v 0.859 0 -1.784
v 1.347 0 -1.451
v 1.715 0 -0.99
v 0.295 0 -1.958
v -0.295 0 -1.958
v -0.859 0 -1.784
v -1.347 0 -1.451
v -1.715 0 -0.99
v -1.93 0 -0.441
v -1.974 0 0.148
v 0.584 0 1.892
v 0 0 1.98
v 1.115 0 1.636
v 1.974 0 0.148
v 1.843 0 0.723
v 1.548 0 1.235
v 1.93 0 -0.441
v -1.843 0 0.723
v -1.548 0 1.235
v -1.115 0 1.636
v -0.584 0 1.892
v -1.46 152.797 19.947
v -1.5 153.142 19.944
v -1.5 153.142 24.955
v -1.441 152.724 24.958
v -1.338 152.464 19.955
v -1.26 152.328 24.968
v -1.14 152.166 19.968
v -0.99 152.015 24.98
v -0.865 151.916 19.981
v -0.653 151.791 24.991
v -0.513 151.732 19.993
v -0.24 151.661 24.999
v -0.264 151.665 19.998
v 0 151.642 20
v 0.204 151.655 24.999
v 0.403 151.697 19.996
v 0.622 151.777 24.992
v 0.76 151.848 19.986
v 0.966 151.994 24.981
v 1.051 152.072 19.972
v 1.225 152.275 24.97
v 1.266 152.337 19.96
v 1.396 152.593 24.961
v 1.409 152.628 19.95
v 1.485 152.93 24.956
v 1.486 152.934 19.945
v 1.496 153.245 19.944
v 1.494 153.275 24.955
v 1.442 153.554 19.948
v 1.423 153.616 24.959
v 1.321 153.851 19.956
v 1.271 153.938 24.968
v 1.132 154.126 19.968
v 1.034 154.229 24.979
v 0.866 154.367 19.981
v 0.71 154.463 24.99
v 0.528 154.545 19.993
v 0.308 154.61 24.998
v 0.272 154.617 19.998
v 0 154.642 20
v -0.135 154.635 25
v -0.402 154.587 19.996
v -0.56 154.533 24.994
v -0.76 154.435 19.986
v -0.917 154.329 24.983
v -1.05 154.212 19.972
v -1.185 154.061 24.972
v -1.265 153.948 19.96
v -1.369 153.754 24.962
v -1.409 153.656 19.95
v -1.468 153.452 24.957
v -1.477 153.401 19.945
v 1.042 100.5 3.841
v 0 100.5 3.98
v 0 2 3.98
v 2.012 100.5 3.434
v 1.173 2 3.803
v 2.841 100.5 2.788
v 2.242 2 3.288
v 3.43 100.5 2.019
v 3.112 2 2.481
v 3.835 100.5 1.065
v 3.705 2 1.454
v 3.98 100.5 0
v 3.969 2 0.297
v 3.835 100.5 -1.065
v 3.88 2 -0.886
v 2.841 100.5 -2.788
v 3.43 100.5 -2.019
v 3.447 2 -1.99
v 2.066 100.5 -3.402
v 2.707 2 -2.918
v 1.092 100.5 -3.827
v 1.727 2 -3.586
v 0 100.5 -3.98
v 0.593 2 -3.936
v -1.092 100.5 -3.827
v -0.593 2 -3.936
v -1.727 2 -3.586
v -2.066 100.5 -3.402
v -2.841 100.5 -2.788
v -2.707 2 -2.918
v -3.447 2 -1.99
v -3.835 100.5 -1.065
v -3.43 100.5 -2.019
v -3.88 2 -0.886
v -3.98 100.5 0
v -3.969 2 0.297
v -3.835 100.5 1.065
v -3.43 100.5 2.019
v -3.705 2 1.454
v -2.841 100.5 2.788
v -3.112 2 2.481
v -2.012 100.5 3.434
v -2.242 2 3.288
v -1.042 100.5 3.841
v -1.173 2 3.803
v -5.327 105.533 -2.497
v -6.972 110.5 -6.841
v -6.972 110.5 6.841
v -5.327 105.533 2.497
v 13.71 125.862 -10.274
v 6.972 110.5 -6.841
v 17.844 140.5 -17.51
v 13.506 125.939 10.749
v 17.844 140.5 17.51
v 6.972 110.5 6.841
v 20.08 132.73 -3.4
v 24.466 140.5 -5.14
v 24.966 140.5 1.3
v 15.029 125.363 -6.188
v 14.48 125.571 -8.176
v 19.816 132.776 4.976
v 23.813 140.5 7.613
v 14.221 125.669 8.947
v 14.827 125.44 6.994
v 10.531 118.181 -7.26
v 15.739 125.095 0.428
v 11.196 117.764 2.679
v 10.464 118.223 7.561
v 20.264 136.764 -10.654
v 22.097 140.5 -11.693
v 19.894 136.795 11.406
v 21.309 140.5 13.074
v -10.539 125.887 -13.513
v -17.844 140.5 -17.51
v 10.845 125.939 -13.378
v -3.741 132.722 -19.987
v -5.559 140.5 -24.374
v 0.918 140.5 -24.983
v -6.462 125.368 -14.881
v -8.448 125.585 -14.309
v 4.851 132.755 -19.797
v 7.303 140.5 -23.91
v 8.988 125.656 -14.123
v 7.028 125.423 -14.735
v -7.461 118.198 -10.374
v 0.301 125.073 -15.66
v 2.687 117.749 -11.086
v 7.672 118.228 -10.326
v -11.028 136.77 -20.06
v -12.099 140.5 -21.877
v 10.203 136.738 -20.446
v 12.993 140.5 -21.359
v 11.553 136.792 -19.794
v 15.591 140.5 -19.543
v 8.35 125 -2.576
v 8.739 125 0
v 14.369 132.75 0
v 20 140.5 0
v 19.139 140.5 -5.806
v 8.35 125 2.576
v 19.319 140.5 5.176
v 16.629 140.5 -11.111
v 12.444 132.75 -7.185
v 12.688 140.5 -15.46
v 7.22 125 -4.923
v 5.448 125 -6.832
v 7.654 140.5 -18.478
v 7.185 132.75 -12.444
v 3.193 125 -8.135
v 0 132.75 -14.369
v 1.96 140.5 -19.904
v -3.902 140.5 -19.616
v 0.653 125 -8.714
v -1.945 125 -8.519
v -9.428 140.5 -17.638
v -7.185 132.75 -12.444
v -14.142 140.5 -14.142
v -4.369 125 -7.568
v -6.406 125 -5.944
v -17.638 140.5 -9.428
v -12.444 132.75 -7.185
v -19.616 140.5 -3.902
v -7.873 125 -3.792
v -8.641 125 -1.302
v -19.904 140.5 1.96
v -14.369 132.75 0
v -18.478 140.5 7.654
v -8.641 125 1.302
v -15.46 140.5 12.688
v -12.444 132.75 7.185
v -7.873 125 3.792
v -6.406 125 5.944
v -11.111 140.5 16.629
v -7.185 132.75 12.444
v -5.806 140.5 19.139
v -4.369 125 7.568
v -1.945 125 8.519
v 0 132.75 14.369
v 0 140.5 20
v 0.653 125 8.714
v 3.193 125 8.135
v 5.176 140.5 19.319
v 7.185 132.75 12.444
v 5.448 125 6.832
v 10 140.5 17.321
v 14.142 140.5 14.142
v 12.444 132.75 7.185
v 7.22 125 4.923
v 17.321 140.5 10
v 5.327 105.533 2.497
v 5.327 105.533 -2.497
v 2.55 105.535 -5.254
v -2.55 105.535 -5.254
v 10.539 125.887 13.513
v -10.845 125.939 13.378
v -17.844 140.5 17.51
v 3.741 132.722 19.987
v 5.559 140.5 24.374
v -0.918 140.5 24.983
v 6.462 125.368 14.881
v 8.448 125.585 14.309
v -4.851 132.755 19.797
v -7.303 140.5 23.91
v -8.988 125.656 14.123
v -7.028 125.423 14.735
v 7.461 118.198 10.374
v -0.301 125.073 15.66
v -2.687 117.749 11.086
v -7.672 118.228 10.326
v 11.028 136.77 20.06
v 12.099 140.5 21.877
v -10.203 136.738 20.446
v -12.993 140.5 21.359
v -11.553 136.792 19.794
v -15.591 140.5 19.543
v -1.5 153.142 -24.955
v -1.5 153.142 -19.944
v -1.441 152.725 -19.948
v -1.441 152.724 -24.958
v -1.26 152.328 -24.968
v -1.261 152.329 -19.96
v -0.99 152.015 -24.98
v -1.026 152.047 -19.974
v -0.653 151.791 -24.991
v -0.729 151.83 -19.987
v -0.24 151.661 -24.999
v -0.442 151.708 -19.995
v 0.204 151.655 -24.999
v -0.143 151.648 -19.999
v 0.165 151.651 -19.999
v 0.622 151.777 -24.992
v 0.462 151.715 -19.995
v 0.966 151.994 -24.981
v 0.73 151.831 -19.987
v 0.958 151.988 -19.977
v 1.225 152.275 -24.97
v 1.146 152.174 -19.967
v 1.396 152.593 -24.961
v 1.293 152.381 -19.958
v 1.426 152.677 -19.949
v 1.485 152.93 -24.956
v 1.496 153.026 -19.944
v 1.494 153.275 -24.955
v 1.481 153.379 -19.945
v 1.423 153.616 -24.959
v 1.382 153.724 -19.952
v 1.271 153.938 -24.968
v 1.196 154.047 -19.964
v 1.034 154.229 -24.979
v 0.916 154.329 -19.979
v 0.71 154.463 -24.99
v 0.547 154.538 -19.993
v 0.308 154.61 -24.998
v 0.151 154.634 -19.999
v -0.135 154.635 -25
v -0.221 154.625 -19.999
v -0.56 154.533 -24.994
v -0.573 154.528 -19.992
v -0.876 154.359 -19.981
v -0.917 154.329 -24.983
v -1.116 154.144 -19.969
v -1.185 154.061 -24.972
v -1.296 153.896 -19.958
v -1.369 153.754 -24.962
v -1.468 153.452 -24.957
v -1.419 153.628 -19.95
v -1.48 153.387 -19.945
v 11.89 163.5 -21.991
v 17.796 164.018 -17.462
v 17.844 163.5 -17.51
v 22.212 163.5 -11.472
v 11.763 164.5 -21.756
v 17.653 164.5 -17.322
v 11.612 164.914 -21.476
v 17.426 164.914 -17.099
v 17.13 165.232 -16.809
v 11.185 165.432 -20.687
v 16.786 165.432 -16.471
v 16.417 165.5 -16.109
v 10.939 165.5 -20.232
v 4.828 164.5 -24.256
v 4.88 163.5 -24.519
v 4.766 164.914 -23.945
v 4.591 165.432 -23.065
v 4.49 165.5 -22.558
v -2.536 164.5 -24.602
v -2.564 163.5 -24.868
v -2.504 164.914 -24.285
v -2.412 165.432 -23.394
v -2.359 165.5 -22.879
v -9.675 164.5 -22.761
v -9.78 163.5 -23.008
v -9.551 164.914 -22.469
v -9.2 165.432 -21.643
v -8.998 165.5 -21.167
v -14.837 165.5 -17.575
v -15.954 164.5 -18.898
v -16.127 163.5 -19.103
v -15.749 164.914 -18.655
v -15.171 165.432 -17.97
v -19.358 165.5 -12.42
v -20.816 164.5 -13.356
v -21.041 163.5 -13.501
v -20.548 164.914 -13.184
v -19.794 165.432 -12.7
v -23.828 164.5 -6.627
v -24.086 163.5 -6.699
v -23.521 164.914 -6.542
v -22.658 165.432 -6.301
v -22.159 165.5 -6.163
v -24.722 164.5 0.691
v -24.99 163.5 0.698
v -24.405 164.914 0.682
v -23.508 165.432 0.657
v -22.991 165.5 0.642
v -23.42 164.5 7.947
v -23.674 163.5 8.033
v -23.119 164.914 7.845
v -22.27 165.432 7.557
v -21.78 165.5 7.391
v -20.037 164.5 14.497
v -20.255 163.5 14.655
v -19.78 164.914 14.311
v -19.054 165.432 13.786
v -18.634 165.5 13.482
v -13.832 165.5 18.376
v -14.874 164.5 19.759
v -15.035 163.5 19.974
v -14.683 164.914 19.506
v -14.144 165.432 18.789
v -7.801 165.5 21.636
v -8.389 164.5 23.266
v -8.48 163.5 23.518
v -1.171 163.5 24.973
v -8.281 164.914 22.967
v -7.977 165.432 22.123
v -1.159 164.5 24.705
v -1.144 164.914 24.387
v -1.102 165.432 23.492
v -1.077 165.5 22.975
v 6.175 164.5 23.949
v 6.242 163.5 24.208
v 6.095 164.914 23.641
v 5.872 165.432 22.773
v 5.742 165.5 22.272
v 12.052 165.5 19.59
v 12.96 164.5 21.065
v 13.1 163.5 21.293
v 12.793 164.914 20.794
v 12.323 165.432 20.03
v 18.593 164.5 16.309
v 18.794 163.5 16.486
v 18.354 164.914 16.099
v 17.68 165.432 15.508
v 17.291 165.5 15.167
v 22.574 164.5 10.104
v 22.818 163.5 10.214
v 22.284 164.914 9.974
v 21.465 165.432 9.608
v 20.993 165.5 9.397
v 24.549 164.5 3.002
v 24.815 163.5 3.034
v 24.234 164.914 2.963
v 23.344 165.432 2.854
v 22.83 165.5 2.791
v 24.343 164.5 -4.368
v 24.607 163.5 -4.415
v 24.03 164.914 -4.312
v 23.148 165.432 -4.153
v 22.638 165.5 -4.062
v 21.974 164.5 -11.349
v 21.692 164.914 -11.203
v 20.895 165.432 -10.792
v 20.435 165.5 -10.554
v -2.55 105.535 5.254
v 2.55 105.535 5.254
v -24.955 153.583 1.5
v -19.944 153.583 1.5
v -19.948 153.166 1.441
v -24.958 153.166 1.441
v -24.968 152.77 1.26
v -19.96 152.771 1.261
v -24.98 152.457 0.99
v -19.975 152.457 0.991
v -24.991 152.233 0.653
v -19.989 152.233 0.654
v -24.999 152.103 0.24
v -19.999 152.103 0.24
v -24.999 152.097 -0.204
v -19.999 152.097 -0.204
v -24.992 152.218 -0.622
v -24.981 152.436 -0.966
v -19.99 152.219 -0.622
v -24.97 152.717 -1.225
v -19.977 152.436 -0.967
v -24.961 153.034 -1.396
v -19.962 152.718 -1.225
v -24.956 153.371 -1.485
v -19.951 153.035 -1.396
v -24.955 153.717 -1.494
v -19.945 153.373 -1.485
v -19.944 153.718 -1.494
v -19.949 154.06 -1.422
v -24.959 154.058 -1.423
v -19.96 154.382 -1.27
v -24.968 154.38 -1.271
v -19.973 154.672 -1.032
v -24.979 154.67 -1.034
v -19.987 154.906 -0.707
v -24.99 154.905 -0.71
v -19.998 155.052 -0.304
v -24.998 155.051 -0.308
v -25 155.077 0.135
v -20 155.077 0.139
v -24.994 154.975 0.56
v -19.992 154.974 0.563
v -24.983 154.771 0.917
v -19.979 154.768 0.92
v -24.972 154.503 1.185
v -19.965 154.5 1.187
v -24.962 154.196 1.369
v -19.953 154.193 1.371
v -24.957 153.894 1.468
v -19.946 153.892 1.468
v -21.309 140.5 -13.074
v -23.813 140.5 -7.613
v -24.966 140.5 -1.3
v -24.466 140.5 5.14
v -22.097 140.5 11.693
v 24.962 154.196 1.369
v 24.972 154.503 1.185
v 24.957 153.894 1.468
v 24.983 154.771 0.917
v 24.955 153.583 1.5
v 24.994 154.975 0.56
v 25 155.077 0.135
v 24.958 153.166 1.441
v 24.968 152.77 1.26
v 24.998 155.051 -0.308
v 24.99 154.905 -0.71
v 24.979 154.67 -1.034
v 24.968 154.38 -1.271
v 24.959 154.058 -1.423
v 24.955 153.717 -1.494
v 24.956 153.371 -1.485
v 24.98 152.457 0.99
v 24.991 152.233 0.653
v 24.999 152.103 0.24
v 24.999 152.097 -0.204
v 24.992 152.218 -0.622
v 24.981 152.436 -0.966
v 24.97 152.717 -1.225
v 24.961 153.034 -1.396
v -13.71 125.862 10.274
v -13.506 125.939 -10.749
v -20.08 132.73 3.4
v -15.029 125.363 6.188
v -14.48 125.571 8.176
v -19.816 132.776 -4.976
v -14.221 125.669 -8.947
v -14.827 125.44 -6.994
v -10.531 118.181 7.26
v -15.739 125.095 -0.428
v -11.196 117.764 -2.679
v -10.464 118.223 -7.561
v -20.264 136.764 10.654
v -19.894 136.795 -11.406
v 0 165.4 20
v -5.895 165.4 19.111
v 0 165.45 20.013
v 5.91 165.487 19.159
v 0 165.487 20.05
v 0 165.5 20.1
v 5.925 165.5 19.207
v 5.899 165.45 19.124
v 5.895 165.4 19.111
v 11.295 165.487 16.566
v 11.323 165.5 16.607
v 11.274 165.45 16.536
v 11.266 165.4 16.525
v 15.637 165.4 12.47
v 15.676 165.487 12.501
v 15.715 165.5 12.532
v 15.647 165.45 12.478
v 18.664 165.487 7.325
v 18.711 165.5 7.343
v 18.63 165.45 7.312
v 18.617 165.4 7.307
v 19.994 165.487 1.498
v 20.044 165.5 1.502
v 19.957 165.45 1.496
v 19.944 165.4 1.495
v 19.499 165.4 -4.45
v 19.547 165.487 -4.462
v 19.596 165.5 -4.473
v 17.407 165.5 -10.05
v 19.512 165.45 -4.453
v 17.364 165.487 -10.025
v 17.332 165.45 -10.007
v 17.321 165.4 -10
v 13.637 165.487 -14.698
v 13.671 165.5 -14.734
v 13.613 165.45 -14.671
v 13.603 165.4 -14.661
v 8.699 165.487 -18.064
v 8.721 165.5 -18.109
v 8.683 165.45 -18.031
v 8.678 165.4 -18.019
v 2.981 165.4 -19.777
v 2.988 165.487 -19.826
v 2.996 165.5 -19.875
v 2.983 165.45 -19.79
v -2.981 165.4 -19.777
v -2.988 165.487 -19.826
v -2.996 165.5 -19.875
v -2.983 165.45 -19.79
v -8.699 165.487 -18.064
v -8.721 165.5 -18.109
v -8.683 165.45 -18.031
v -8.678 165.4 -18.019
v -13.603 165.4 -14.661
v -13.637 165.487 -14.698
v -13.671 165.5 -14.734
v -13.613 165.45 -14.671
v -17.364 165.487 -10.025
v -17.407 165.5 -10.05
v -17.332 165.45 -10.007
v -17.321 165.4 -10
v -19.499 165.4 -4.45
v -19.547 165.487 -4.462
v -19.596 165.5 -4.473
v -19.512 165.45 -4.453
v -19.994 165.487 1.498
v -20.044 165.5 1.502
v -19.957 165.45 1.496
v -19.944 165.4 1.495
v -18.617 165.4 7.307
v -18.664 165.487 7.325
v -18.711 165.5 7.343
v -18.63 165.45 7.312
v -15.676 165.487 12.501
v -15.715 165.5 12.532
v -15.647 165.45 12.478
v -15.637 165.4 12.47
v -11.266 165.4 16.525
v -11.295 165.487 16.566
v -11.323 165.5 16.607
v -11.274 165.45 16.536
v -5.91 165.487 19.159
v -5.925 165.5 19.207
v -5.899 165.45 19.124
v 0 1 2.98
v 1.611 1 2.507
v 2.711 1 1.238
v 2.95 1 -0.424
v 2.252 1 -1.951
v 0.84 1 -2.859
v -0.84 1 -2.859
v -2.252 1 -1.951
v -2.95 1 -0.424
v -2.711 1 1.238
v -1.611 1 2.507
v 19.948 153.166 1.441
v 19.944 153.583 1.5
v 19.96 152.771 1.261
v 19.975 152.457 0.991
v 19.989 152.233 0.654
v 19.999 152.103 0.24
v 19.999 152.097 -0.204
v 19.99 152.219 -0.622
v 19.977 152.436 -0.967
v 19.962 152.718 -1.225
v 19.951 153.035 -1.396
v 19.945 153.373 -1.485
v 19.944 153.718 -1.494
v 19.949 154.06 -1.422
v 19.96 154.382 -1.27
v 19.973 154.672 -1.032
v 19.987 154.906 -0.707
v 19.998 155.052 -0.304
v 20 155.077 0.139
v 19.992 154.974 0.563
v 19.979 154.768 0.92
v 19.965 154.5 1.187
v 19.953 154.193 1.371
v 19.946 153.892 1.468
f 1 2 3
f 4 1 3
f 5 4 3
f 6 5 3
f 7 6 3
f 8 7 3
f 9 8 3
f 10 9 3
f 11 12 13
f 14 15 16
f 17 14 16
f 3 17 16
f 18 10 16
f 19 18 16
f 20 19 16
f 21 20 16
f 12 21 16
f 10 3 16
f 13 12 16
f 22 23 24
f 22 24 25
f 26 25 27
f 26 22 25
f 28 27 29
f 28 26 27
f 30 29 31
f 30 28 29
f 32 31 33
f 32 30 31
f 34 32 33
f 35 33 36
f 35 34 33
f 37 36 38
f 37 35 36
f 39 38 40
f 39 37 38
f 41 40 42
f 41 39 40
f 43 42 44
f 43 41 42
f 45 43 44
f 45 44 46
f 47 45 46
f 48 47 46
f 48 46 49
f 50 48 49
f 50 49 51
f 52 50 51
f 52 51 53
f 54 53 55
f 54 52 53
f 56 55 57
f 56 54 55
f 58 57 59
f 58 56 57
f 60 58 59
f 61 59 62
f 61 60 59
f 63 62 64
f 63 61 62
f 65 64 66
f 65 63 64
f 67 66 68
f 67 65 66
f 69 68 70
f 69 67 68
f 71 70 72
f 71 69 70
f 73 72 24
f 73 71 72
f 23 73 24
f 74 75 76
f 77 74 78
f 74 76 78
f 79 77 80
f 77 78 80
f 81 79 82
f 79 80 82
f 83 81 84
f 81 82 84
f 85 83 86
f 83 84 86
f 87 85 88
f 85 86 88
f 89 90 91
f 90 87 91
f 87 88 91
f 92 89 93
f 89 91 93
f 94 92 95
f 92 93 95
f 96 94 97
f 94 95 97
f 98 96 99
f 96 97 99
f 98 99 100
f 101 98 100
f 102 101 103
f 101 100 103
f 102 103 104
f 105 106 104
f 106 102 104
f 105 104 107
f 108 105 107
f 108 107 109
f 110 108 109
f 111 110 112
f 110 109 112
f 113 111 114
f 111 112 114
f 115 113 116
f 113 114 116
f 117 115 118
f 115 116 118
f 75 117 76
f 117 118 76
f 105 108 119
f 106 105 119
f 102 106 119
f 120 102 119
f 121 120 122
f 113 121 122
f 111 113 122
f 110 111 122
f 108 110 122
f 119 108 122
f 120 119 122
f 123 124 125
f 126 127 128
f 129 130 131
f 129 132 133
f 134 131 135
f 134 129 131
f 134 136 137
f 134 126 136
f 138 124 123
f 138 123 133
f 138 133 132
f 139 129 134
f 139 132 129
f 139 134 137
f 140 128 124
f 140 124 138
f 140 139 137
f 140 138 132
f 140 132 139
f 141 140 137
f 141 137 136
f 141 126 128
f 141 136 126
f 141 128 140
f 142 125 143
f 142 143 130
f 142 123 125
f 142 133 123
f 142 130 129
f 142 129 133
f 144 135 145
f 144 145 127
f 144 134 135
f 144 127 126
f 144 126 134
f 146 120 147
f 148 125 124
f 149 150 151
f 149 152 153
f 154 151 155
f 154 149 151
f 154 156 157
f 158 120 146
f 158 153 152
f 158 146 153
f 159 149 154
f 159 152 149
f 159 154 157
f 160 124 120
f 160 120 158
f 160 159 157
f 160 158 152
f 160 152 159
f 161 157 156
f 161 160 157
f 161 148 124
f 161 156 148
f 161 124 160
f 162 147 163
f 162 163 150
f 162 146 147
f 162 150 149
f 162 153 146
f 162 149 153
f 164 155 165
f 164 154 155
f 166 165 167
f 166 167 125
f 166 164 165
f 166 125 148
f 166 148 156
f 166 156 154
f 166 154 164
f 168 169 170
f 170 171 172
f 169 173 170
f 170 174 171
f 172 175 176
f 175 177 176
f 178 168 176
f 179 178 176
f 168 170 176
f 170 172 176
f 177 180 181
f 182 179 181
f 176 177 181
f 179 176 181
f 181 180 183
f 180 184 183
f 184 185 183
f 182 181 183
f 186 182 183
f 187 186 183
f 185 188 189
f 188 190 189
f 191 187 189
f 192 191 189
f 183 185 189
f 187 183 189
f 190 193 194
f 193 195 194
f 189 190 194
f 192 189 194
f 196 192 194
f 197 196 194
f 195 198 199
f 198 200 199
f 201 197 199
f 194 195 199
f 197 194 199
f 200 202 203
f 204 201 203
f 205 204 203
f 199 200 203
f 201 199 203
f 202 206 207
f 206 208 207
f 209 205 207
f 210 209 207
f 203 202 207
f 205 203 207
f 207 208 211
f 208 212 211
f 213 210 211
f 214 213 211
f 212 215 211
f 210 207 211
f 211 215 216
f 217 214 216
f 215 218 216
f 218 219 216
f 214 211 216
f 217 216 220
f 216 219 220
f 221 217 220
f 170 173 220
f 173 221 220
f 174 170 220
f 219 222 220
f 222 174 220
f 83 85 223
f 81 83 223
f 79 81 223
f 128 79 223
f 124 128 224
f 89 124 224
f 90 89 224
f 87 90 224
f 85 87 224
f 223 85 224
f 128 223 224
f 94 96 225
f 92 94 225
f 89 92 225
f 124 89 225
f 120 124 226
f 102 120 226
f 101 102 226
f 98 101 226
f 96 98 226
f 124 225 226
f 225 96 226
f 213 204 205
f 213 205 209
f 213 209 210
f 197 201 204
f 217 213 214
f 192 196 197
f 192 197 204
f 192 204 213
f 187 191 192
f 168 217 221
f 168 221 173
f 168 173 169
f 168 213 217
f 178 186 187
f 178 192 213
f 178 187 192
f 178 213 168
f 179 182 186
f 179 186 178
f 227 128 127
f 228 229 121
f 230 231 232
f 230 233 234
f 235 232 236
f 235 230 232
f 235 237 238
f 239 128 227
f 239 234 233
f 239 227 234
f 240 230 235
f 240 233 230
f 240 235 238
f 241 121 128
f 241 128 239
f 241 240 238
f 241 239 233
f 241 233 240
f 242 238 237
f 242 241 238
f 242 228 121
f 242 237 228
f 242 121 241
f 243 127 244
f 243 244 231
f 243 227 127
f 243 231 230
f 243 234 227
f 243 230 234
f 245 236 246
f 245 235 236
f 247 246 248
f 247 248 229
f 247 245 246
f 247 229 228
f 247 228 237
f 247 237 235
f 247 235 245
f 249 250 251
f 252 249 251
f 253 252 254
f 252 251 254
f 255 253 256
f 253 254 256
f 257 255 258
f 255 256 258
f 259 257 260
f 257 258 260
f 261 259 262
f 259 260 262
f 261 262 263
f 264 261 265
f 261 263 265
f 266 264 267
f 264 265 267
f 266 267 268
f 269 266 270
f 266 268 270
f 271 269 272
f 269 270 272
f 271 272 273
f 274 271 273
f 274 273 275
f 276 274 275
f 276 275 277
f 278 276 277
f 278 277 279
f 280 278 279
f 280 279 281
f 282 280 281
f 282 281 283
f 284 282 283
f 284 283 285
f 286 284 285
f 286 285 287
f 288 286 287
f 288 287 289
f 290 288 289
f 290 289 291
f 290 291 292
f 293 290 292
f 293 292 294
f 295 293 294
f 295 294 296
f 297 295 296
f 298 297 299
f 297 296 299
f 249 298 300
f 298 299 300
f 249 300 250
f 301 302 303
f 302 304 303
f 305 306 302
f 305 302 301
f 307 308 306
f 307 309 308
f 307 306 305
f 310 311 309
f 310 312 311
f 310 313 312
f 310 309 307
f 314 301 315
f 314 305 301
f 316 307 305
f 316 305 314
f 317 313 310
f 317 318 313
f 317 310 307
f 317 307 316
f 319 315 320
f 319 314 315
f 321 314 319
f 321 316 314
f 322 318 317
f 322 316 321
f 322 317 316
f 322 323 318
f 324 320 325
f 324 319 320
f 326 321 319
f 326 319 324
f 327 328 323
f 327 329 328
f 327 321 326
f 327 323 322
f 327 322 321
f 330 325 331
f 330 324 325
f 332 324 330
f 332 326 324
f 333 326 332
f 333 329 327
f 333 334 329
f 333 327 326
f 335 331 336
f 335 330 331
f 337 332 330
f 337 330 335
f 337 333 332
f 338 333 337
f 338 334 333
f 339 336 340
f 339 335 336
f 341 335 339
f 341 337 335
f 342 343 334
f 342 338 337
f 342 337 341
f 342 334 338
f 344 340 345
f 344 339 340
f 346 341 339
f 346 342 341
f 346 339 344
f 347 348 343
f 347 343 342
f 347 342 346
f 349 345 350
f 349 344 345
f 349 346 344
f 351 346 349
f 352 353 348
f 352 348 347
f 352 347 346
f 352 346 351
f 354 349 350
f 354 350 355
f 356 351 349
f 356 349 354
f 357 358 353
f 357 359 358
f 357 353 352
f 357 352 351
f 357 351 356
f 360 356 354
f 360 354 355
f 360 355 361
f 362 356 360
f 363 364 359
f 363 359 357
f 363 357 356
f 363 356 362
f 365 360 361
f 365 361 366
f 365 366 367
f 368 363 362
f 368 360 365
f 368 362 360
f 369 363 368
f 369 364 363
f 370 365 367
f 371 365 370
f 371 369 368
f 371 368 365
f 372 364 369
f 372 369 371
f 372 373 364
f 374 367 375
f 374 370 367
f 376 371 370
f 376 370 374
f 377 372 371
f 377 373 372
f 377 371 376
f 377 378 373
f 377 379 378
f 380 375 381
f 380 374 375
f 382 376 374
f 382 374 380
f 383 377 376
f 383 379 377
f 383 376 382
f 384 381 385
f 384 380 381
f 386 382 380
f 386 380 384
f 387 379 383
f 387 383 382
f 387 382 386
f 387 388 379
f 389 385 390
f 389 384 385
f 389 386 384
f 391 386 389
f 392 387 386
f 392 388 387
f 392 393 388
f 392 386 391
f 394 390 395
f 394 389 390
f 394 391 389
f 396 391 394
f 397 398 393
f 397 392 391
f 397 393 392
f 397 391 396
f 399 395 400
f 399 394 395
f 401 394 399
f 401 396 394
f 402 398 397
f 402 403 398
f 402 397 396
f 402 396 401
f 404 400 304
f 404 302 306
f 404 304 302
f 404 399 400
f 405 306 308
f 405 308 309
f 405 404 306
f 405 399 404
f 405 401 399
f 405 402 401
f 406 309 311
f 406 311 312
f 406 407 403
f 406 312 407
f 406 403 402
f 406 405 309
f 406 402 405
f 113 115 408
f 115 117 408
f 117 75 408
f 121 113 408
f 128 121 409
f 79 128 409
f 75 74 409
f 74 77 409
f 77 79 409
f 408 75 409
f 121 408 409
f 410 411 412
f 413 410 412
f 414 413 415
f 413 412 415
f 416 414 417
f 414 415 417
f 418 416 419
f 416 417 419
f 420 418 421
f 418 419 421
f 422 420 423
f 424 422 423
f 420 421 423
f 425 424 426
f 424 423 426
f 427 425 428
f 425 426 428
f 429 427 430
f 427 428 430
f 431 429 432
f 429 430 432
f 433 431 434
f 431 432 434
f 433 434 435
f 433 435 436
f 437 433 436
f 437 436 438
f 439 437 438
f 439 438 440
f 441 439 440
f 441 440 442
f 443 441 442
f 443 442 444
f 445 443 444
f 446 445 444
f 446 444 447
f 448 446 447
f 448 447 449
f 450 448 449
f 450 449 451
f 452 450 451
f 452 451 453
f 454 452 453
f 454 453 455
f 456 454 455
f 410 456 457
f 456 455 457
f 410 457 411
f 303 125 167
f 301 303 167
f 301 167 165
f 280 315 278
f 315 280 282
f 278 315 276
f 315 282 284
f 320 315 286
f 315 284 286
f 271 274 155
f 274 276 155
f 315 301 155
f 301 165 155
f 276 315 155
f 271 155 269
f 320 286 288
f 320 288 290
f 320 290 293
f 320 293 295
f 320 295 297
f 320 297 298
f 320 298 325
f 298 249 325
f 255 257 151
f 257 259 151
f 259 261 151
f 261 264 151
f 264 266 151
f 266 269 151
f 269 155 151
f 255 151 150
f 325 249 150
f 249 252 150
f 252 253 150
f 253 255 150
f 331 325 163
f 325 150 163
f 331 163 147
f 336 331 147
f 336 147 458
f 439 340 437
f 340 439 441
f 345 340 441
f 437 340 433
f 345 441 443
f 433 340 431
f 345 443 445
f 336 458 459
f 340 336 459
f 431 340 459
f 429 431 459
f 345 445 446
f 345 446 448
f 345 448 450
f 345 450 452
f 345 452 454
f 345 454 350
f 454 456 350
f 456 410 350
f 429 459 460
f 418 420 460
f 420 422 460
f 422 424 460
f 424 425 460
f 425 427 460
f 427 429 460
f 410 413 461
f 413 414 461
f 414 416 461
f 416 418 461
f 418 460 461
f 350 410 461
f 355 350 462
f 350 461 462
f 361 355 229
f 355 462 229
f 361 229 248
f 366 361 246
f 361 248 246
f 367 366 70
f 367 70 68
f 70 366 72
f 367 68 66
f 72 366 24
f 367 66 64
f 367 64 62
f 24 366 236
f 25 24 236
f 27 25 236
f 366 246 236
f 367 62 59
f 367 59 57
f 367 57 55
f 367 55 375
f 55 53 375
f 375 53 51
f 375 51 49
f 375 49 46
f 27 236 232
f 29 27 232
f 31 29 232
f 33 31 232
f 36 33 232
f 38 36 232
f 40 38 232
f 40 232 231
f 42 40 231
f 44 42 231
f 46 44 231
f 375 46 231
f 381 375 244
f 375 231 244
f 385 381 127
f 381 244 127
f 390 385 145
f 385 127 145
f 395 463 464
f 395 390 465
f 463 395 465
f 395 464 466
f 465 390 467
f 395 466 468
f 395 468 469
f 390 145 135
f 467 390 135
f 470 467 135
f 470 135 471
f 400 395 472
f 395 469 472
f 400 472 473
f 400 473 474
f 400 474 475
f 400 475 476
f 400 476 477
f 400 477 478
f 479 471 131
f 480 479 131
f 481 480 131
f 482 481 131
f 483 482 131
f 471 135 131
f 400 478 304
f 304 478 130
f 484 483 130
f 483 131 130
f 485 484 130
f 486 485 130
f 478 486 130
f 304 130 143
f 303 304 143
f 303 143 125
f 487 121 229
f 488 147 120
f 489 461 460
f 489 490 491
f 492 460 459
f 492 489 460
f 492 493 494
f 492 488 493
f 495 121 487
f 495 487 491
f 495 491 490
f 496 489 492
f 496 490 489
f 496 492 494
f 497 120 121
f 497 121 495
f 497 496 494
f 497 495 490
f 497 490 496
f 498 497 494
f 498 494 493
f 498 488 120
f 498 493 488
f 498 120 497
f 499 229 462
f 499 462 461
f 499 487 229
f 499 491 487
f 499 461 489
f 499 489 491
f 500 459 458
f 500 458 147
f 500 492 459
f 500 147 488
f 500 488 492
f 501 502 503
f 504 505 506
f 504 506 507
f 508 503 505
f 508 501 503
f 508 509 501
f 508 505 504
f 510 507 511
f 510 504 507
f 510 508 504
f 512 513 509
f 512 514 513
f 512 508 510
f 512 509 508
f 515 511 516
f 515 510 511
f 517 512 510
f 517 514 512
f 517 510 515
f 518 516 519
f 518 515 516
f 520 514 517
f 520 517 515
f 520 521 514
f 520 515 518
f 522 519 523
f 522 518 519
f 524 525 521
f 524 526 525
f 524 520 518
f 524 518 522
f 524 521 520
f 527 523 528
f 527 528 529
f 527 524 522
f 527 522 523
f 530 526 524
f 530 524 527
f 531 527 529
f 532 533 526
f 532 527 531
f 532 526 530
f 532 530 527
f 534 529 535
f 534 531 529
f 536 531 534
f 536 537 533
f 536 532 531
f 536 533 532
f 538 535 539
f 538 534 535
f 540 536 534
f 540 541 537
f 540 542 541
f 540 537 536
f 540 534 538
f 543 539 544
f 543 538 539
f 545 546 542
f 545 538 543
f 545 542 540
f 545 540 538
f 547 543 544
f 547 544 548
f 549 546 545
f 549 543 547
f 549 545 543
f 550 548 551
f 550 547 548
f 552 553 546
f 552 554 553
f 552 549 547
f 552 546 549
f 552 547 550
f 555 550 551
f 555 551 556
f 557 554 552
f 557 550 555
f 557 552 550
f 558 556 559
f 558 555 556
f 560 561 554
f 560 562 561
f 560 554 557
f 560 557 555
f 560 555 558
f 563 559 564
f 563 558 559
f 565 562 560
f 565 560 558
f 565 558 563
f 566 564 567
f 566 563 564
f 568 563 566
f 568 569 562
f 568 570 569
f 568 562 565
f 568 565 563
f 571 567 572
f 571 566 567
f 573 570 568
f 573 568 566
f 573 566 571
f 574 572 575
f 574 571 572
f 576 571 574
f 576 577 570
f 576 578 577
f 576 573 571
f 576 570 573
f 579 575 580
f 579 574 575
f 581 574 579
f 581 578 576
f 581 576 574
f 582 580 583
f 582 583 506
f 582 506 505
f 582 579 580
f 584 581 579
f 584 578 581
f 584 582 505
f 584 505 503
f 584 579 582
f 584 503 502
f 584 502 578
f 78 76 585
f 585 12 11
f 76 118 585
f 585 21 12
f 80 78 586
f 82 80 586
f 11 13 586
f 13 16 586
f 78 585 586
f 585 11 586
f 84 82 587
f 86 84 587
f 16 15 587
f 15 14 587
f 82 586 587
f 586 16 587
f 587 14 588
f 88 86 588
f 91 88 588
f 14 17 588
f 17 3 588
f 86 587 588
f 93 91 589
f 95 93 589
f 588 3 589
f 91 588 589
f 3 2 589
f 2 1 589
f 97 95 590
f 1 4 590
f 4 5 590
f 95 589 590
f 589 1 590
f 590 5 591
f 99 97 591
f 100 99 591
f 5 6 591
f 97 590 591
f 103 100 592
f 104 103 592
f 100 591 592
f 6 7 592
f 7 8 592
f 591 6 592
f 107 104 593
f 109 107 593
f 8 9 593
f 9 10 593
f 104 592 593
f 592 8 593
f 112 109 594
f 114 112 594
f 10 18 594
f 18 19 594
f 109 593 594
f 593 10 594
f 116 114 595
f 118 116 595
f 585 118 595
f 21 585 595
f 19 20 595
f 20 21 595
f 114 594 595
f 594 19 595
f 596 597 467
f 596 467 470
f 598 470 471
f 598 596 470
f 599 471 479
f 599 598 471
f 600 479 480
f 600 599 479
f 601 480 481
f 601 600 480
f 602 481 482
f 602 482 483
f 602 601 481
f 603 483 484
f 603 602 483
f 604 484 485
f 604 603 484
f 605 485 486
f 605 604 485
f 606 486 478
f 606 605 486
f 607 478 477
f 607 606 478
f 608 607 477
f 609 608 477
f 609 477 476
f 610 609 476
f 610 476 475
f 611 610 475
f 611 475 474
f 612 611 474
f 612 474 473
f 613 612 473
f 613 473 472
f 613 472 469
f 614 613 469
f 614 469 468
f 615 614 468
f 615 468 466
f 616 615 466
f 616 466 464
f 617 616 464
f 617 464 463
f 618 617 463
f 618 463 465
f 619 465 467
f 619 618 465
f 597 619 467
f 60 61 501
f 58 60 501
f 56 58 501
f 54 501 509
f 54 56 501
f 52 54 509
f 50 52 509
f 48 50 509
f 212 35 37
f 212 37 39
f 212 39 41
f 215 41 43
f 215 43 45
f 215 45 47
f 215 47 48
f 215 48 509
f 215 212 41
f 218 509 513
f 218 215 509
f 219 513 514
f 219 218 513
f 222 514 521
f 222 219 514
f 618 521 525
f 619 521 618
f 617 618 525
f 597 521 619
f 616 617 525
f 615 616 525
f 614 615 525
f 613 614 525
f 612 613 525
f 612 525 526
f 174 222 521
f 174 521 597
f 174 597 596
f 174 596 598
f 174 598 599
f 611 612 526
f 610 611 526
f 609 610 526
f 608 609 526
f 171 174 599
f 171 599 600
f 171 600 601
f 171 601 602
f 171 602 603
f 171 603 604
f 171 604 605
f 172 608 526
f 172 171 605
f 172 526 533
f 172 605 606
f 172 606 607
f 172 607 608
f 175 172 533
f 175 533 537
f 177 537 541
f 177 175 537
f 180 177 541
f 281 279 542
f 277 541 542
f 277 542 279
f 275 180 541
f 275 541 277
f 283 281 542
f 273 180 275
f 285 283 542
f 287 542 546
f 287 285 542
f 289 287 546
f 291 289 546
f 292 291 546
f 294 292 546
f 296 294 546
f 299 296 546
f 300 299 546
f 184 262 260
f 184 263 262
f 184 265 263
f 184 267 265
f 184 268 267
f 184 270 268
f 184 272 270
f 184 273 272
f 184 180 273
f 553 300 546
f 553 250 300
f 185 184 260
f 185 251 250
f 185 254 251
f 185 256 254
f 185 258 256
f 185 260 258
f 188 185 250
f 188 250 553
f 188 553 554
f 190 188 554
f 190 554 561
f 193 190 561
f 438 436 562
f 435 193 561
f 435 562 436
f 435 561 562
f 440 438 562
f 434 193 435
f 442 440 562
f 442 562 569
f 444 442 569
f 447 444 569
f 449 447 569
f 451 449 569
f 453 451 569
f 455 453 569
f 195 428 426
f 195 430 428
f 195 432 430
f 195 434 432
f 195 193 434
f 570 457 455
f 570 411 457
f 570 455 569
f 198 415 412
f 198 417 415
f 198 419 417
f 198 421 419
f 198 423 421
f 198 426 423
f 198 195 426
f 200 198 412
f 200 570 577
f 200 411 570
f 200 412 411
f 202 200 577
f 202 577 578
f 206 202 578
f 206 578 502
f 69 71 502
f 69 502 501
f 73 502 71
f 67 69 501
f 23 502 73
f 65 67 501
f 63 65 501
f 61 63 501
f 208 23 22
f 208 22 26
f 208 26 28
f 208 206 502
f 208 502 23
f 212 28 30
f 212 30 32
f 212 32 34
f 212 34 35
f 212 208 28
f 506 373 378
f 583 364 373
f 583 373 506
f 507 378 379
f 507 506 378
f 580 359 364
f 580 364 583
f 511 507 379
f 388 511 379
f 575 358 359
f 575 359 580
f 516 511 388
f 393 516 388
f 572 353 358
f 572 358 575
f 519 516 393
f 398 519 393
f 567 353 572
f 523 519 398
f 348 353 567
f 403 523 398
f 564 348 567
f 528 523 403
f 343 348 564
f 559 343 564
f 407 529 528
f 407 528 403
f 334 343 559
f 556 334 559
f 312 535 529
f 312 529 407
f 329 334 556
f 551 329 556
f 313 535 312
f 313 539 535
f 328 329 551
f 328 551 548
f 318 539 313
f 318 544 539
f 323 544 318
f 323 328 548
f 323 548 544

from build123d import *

# Parameters (mm, degrees)
SKETCH1_R               = 3.98
BOSS_EXTRUDE1_DEPTH     = 85
SKETCH2_R               = 3.98
BOSS_EXTRUDE2_DEPTH     = 15.5
SKETCH8_R               = 20
CUT_EXTRUDE2_DEPTH      = 15.5
CUT_EXTRUDE2_DRAFT      = -36
SKETCH9_R               = 25
SKETCH9_R_2             = 20
BOSS_EXTRUDE3_DEPTH     = 25
CUT_EXTRUDE3_DEPTH      = 30
CUT_EXTRUDE3_DEPTH_BACK = 30
SKETCH11_R              = 1.5
CUT_EXTRUDE4_DEPTH      = 30
CUT_EXTRUDE4_DEPTH_BACK = 30
SKETCH12_R              = 1.5
FILLET2_R               = 2
FILLET3_R               = 0.1
CHAMFER1_SIZE           = 2


with BuildPart() as part:
    # Sketch1 → Boss-Extrude1 (new body)
    with BuildSketch(Plane(origin=(0, 0, 0), x_dir=(1, 0, 0), z_dir=(0, 1, 0))):
        Circle(SKETCH1_R)
    extrude(amount=BOSS_EXTRUDE1_DEPTH)

    # Sketch2 → Boss-Extrude2 (add)
    with BuildSketch(Plane(origin=(0, 85, 0), x_dir=(1, 0, 0), z_dir=(0, 1, 0))):
        Circle(SKETCH2_R)
    extrude(amount=BOSS_EXTRUDE2_DEPTH)

    # Sketch5 → Loft1 section 0
    with BuildSketch(Plane(origin=(0, 110.5, 0), x_dir=(1, 0, 0), z_dir=(0, 1, 0))):
        with BuildLine():
            Line((-6.97197941, 6.841269849), (6.97197941, 6.841269849))
            Line((6.97197941, 6.841269849), (6.97197941, -6.841269849))
            Line((6.97197941, -6.841269849), (-6.97197941, -6.841269849))
            Line((-6.97197941, -6.841269849), (-6.97197941, 6.841269849))
        make_face()
    # Sketch4 for Loft1 → Loft1 section 1
    with BuildSketch(Plane(origin=(0, 100.5, 0), x_dir=(1, 0, 0), z_dir=(0, 1, 0))):
        with BuildLine():
            # circular arc as an exact rational Bezier (weights 1, cos(half-angle), 1)
            Bezier((-2.840788324, 2.787529677), (0, 5.682594209), (2.840788324, 2.787529677), weights=[1, 0.700384341, 1])
            Bezier((2.840788324, 2.787529677), (5.576057838, 0), (2.840788324, -2.787529677), weights=[1, 0.713765911, 1])
            Bezier((2.840788324, -2.787529677), (0, -5.682594209), (-2.840788324, -2.787529677), weights=[1, 0.700384341, 1])
            Bezier((-2.840788324, -2.787529677), (-5.576057838, 0), (-2.840788324, 2.787529677), weights=[1, 0.713765911, 1])
        make_face()
    loft()

    # Sketch6 for Loft2 → Loft2 section 0
    with BuildSketch(Plane(origin=(0, 140.5, 0), x_dir=(1, 0, 0), z_dir=(0, 1, 0))):
        with BuildLine():
            Bezier((-17.844147765, 17.509608521), (0, 35.694687248), (17.844147765, 17.509608521), weights=[1, 0.700384341, 1])
            Bezier((17.844147765, 17.509608521), (35.025488929, 0), (17.844147765, -17.509608521), weights=[1, 0.713765911, 1])
            Bezier((17.844147765, -17.509608521), (0, -35.694687248), (-17.844147765, -17.509608521), weights=[1, 0.700384341, 1])
            Bezier((-17.844147765, -17.509608521), (-35.025488929, 0), (-17.844147765, 17.509608521), weights=[1, 0.713765911, 1])
        make_face()
    # Sketch7 → Loft2 section 1
    with BuildSketch(Plane(origin=(0, 110.5, 0), x_dir=(1, 0, 0), z_dir=(0, 1, 0))):
        with BuildLine():
            Line((-6.97197941, 6.841269849), (6.97197941, 6.841269849))
            Line((6.97197941, 6.841269849), (6.97197941, -6.841269849))
            Line((6.97197941, -6.841269849), (-6.97197941, -6.841269849))
            Line((-6.97197941, -6.841269849), (-6.97197941, 6.841269849))
        make_face()
    loft()


with BuildPart() as cut_extrude2_tool:
    # Sketch8 → Cut-Extrude2 (with draft: the straight prism first)
    with BuildSketch(Plane(origin=(0, 140.5, 0), x_dir=(1, 0, 0), z_dir=(0, 1, 0))):
        Circle(SKETCH8_R)
    extrude(amount=-CUT_EXTRUDE2_DEPTH)
    # Cut-Extrude2: the draft: its side faces are tilted about the plane it starts from
    cut_extrude2_sides = [cut_extrude2_tool.faces().sort_by_distance(p)[0] for p in [
        (-20, 132.75, 0),
    ]]
    draft(cut_extrude2_sides, Plane(origin=(0, 140.5, 0), x_dir=(1, 0, 0), z_dir=(0, 1, 0)), CUT_EXTRUDE2_DRAFT)


with BuildPart() as part_1:
    add(part.part)

    # Cut-Extrude2: cut by cut_extrude2_tool
    add(cut_extrude2_tool.part, mode=Mode.SUBTRACT)

    # Sketch9 → Boss-Extrude3 (add)
    with BuildSketch(Plane(origin=(0, 140.5, 0), x_dir=(1, 0, 0), z_dir=(0, 1, 0))):
        Circle(SKETCH9_R)
        Circle(SKETCH9_R_2, mode=Mode.SUBTRACT)
    extrude(amount=BOSS_EXTRUDE3_DEPTH)

    # Sketch11 → Cut-Extrude3 (cut, two sides: drawn at the far end of the back side and taken through both)
    with BuildSketch(Plane(origin=(0, 0, 0), x_dir=(0, 0, -1), z_dir=(1, 0, 0)).offset(-CUT_EXTRUDE3_DEPTH_BACK)):
        with Locations((0, 153.583337253)):
            Circle(SKETCH11_R)
    extrude(amount=CUT_EXTRUDE3_DEPTH + CUT_EXTRUDE3_DEPTH_BACK, mode=Mode.SUBTRACT)

    # Sketch12 → Cut-Extrude4 (cut, two sides: drawn at the far end of the back side and taken through both)
    with BuildSketch(Plane.XY.offset(-CUT_EXTRUDE4_DEPTH_BACK)):
        with Locations((0, 153.141524967)):
            Circle(SKETCH12_R)
    extrude(amount=CUT_EXTRUDE4_DEPTH + CUT_EXTRUDE4_DEPTH_BACK, mode=Mode.SUBTRACT)

    # Fillet2
    fillet2_edges = [part_1.edges().sort_by_distance(p)[0] for p in [
        (-25, 165.5, 0),
    ]]
    fillet(fillet2_edges, radius=FILLET2_R)

    # Fillet3
    fillet3_edges = [part_1.edges().sort_by_distance(p)[0] for p in [
        (-20, 165.5, 0),
    ]]
    fillet(fillet3_edges, radius=FILLET3_R)

    # Chamfer1
    chamfer1_edges = [part_1.edges().sort_by_distance(p)[0] for p in [
        (-3.98, 0, 0),
    ]]
    chamfer(chamfer1_edges, length=CHAMFER1_SIZE)


solid = part_1.part
